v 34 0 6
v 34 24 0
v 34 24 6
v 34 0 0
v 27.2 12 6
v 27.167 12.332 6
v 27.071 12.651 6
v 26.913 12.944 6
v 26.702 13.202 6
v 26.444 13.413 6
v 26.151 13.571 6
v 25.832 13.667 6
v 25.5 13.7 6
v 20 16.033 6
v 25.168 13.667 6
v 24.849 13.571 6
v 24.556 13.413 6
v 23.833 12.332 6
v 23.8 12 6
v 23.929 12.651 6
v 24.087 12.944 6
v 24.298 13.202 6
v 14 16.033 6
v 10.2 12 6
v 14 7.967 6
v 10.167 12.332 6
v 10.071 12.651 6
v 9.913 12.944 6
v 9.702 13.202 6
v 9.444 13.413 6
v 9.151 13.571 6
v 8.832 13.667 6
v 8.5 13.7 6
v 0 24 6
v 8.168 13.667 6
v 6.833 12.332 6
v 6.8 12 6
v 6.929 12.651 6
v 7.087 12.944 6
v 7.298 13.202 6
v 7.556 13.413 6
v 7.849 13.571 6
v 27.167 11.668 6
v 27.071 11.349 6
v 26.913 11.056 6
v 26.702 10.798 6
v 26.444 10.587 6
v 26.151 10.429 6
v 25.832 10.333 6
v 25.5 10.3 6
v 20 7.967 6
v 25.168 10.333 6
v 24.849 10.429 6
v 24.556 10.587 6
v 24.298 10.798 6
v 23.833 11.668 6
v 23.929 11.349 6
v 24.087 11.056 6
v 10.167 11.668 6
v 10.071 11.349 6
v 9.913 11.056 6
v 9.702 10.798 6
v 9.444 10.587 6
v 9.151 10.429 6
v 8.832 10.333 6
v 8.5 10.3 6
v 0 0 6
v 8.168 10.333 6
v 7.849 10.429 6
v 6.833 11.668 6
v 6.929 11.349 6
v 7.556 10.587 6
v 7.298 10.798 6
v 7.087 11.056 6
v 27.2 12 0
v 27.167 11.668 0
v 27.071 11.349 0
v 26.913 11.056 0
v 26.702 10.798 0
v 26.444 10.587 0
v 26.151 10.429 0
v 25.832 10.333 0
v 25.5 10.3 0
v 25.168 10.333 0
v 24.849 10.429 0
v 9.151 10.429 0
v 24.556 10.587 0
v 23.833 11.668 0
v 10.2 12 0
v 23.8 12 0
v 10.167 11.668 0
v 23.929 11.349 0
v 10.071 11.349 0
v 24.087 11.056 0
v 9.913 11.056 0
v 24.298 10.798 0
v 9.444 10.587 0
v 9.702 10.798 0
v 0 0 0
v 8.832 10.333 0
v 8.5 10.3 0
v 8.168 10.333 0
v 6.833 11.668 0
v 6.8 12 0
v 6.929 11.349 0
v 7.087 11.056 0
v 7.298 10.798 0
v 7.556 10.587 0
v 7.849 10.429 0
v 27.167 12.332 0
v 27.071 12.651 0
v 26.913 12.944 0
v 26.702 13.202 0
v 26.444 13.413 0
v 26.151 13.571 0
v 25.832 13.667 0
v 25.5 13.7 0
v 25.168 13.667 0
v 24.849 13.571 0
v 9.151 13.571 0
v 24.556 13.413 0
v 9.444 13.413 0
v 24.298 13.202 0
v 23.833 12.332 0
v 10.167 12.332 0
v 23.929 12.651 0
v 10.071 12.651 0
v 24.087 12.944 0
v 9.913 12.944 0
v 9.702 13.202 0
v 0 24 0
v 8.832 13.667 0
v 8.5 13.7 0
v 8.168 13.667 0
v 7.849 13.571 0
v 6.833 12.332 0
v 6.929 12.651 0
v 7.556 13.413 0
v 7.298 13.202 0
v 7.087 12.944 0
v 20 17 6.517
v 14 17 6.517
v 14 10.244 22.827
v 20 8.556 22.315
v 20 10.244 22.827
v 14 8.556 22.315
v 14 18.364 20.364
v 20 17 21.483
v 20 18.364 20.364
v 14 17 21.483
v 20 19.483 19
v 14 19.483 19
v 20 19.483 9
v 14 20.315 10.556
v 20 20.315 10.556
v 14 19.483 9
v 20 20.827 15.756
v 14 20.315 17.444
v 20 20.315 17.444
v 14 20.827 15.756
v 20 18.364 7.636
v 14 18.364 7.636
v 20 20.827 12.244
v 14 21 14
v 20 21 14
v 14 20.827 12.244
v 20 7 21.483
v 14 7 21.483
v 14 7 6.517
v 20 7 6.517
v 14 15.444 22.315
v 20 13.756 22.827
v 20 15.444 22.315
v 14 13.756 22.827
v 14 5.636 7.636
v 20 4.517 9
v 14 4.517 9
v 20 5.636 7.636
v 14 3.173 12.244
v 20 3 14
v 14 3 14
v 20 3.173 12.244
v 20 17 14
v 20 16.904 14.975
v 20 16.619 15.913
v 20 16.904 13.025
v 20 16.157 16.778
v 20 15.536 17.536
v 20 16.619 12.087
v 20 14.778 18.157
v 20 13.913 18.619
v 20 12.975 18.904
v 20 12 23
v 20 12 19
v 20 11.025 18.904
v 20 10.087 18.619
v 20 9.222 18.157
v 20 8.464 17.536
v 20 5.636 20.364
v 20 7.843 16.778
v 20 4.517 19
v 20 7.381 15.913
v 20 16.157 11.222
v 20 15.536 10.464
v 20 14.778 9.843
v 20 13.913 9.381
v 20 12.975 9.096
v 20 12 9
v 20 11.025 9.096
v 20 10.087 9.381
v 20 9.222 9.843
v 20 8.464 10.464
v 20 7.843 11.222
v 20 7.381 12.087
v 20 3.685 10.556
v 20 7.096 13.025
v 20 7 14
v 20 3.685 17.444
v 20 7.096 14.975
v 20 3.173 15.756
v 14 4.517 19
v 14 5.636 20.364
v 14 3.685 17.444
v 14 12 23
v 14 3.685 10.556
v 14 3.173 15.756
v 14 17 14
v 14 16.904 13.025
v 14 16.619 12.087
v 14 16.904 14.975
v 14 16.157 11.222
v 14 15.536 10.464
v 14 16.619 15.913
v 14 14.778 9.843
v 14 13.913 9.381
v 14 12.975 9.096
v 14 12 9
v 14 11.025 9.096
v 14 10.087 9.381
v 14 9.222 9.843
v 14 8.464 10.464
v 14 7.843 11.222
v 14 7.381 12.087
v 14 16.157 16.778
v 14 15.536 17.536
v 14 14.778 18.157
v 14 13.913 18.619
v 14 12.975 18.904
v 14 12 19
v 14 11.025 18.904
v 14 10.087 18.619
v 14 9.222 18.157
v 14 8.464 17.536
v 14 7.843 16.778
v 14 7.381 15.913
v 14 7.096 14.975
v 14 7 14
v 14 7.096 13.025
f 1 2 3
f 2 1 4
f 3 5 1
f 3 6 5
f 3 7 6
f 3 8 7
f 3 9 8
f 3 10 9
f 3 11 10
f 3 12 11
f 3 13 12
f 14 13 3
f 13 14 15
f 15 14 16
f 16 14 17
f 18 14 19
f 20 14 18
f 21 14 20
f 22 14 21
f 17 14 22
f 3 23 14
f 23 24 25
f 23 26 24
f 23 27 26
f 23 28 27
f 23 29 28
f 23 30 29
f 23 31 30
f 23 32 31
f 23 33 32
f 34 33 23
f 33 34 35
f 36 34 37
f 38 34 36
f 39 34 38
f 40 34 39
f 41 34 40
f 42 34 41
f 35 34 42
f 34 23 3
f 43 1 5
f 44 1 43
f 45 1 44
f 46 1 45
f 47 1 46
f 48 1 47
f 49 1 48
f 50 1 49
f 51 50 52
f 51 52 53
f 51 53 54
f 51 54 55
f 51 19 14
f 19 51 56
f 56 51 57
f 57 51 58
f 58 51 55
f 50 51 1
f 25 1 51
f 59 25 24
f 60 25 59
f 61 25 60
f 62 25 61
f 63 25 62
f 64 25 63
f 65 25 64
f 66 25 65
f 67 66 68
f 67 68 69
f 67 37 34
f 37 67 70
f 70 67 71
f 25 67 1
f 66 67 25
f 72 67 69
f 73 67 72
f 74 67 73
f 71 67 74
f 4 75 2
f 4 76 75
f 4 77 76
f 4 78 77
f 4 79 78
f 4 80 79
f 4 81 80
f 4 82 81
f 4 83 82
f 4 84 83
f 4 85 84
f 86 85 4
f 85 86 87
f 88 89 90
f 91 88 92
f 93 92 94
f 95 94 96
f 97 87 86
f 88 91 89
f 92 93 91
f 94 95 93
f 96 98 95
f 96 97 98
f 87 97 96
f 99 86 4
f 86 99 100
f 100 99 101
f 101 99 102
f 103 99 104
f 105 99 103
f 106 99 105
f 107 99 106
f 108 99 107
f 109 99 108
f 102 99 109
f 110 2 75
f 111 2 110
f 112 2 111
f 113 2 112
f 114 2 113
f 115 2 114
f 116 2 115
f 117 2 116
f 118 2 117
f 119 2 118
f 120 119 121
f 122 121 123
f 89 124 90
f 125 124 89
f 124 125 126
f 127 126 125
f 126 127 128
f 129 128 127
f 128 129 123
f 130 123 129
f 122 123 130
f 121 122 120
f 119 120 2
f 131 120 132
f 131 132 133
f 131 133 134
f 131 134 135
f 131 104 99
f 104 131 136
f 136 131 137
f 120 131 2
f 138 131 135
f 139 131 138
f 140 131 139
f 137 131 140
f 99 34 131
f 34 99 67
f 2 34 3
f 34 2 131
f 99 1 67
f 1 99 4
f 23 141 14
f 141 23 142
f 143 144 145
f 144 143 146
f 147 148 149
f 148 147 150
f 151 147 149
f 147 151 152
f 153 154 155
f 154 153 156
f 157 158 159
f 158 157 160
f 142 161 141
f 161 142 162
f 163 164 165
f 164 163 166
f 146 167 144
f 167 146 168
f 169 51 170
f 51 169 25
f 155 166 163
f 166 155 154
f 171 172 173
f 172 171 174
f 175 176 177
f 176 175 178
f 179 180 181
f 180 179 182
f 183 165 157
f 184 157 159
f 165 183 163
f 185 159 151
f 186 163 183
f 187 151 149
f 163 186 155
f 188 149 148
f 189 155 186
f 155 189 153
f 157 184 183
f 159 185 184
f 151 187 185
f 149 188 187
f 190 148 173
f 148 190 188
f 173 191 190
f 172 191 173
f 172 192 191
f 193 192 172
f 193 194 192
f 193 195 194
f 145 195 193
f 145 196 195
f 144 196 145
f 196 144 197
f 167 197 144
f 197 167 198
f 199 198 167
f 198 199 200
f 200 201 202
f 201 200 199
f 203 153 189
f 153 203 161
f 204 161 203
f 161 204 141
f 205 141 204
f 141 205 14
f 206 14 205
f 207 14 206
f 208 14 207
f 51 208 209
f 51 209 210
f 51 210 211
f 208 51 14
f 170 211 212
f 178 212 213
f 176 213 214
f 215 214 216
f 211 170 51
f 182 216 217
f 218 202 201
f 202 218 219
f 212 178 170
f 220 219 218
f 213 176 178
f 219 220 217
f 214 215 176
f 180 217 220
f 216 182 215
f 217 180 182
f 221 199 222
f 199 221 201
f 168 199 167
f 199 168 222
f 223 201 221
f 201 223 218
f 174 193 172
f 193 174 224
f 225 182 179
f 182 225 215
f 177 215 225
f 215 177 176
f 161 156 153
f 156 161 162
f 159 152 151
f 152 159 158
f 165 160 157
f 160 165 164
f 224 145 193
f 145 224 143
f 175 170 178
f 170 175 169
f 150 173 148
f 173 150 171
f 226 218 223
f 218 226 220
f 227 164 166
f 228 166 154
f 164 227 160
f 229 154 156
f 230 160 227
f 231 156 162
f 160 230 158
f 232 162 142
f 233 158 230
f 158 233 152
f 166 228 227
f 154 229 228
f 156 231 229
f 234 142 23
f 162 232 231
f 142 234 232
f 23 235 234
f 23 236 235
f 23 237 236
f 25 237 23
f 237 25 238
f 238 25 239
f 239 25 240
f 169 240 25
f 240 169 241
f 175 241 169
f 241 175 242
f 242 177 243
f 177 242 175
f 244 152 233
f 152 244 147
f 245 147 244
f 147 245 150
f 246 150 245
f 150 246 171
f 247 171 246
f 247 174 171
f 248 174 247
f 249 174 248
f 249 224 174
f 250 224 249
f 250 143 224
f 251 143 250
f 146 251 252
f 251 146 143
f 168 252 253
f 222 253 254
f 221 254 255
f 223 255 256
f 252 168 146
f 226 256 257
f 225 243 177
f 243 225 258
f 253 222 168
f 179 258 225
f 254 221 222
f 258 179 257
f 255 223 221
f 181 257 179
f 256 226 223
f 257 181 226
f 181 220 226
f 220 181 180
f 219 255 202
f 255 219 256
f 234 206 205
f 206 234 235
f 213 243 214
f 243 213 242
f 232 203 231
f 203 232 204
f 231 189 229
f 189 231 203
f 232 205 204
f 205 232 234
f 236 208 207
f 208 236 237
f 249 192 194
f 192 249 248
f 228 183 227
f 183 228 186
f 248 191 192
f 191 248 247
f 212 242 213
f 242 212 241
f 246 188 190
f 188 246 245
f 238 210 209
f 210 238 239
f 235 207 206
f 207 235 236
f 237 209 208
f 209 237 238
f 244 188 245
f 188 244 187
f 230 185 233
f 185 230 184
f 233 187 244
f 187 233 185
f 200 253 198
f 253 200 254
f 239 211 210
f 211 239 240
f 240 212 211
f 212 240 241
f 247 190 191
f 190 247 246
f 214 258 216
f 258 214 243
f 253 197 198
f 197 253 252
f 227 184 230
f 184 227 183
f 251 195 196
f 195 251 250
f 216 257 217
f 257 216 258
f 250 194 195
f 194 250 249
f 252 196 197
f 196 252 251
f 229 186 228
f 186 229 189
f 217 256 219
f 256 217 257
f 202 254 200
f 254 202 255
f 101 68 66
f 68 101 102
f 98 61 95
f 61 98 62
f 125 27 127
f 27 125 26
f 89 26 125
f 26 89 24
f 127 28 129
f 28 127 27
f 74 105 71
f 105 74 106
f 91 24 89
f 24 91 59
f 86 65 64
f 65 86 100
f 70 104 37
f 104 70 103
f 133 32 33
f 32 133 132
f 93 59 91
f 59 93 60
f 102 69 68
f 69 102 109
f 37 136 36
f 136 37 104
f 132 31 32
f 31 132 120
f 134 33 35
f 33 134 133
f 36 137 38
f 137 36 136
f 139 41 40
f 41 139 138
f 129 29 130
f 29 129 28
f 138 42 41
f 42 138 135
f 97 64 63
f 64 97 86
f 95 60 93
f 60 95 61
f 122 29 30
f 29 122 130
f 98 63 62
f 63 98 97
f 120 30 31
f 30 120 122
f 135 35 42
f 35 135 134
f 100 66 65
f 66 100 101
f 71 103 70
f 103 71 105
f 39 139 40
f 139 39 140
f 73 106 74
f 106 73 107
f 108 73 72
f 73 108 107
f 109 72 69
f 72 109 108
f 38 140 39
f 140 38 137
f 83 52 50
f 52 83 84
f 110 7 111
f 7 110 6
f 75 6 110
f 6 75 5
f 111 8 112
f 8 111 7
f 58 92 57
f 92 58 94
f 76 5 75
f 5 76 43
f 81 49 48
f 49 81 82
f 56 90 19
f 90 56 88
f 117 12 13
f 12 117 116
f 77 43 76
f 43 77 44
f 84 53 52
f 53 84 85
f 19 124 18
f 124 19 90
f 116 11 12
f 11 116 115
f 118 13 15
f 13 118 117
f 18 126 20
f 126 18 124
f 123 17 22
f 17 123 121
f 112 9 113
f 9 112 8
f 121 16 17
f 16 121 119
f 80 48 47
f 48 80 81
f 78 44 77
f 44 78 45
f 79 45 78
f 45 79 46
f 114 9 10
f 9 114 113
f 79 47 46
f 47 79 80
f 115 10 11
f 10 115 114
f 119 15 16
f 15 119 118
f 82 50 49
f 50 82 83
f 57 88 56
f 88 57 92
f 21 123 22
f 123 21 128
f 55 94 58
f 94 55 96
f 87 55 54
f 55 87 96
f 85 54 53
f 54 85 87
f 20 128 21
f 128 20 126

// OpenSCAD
$fn = 32;
// ----------------------------------------------------------------------
// Cable clip: cable 10 mm, clamp 18 mm, base 34 mm
// ----------------------------------------------------------------------

// --- parameters (mm) ---
base_w = 34;              // base length, X
base_d = 24;              // base width, Y
base_t = 6;               // base thickness
clamp_d = 18;             // clamp outside diameter
wall_t = 4;               // clamp wall
cable_d = 10;             // cable opening
ring_w = 6;               // clamp width along the cable
screw_d = 3.4;            // screw clearance
sink = 1;                 // overlap of the clamp into the base

module base() {
  cube([base_w, base_d, base_t]);
}

module clamp() {
  translate([base_w / 2, base_d / 2, base_t + clamp_d / 2 - sink]) rotate([0, 90, 0])
    cylinder(h = ring_w, d = clamp_d, center = true);
}

difference() {
  union() {
    base();
    clamp();
  }
  translate([base_w / 2, base_d / 2, base_t + clamp_d / 2 - sink]) rotate([0, 90, 0]) translate([0, 0, -ring_w / 2 - 1]) cylinder(h = ring_w + 2, d = cable_d);
  translate([8.5, base_d / 2, -1]) cylinder(h = base_t + 2, d = screw_d);
  translate([25.5, base_d / 2, -1]) cylinder(h = base_t + 2, d = screw_d);
}
